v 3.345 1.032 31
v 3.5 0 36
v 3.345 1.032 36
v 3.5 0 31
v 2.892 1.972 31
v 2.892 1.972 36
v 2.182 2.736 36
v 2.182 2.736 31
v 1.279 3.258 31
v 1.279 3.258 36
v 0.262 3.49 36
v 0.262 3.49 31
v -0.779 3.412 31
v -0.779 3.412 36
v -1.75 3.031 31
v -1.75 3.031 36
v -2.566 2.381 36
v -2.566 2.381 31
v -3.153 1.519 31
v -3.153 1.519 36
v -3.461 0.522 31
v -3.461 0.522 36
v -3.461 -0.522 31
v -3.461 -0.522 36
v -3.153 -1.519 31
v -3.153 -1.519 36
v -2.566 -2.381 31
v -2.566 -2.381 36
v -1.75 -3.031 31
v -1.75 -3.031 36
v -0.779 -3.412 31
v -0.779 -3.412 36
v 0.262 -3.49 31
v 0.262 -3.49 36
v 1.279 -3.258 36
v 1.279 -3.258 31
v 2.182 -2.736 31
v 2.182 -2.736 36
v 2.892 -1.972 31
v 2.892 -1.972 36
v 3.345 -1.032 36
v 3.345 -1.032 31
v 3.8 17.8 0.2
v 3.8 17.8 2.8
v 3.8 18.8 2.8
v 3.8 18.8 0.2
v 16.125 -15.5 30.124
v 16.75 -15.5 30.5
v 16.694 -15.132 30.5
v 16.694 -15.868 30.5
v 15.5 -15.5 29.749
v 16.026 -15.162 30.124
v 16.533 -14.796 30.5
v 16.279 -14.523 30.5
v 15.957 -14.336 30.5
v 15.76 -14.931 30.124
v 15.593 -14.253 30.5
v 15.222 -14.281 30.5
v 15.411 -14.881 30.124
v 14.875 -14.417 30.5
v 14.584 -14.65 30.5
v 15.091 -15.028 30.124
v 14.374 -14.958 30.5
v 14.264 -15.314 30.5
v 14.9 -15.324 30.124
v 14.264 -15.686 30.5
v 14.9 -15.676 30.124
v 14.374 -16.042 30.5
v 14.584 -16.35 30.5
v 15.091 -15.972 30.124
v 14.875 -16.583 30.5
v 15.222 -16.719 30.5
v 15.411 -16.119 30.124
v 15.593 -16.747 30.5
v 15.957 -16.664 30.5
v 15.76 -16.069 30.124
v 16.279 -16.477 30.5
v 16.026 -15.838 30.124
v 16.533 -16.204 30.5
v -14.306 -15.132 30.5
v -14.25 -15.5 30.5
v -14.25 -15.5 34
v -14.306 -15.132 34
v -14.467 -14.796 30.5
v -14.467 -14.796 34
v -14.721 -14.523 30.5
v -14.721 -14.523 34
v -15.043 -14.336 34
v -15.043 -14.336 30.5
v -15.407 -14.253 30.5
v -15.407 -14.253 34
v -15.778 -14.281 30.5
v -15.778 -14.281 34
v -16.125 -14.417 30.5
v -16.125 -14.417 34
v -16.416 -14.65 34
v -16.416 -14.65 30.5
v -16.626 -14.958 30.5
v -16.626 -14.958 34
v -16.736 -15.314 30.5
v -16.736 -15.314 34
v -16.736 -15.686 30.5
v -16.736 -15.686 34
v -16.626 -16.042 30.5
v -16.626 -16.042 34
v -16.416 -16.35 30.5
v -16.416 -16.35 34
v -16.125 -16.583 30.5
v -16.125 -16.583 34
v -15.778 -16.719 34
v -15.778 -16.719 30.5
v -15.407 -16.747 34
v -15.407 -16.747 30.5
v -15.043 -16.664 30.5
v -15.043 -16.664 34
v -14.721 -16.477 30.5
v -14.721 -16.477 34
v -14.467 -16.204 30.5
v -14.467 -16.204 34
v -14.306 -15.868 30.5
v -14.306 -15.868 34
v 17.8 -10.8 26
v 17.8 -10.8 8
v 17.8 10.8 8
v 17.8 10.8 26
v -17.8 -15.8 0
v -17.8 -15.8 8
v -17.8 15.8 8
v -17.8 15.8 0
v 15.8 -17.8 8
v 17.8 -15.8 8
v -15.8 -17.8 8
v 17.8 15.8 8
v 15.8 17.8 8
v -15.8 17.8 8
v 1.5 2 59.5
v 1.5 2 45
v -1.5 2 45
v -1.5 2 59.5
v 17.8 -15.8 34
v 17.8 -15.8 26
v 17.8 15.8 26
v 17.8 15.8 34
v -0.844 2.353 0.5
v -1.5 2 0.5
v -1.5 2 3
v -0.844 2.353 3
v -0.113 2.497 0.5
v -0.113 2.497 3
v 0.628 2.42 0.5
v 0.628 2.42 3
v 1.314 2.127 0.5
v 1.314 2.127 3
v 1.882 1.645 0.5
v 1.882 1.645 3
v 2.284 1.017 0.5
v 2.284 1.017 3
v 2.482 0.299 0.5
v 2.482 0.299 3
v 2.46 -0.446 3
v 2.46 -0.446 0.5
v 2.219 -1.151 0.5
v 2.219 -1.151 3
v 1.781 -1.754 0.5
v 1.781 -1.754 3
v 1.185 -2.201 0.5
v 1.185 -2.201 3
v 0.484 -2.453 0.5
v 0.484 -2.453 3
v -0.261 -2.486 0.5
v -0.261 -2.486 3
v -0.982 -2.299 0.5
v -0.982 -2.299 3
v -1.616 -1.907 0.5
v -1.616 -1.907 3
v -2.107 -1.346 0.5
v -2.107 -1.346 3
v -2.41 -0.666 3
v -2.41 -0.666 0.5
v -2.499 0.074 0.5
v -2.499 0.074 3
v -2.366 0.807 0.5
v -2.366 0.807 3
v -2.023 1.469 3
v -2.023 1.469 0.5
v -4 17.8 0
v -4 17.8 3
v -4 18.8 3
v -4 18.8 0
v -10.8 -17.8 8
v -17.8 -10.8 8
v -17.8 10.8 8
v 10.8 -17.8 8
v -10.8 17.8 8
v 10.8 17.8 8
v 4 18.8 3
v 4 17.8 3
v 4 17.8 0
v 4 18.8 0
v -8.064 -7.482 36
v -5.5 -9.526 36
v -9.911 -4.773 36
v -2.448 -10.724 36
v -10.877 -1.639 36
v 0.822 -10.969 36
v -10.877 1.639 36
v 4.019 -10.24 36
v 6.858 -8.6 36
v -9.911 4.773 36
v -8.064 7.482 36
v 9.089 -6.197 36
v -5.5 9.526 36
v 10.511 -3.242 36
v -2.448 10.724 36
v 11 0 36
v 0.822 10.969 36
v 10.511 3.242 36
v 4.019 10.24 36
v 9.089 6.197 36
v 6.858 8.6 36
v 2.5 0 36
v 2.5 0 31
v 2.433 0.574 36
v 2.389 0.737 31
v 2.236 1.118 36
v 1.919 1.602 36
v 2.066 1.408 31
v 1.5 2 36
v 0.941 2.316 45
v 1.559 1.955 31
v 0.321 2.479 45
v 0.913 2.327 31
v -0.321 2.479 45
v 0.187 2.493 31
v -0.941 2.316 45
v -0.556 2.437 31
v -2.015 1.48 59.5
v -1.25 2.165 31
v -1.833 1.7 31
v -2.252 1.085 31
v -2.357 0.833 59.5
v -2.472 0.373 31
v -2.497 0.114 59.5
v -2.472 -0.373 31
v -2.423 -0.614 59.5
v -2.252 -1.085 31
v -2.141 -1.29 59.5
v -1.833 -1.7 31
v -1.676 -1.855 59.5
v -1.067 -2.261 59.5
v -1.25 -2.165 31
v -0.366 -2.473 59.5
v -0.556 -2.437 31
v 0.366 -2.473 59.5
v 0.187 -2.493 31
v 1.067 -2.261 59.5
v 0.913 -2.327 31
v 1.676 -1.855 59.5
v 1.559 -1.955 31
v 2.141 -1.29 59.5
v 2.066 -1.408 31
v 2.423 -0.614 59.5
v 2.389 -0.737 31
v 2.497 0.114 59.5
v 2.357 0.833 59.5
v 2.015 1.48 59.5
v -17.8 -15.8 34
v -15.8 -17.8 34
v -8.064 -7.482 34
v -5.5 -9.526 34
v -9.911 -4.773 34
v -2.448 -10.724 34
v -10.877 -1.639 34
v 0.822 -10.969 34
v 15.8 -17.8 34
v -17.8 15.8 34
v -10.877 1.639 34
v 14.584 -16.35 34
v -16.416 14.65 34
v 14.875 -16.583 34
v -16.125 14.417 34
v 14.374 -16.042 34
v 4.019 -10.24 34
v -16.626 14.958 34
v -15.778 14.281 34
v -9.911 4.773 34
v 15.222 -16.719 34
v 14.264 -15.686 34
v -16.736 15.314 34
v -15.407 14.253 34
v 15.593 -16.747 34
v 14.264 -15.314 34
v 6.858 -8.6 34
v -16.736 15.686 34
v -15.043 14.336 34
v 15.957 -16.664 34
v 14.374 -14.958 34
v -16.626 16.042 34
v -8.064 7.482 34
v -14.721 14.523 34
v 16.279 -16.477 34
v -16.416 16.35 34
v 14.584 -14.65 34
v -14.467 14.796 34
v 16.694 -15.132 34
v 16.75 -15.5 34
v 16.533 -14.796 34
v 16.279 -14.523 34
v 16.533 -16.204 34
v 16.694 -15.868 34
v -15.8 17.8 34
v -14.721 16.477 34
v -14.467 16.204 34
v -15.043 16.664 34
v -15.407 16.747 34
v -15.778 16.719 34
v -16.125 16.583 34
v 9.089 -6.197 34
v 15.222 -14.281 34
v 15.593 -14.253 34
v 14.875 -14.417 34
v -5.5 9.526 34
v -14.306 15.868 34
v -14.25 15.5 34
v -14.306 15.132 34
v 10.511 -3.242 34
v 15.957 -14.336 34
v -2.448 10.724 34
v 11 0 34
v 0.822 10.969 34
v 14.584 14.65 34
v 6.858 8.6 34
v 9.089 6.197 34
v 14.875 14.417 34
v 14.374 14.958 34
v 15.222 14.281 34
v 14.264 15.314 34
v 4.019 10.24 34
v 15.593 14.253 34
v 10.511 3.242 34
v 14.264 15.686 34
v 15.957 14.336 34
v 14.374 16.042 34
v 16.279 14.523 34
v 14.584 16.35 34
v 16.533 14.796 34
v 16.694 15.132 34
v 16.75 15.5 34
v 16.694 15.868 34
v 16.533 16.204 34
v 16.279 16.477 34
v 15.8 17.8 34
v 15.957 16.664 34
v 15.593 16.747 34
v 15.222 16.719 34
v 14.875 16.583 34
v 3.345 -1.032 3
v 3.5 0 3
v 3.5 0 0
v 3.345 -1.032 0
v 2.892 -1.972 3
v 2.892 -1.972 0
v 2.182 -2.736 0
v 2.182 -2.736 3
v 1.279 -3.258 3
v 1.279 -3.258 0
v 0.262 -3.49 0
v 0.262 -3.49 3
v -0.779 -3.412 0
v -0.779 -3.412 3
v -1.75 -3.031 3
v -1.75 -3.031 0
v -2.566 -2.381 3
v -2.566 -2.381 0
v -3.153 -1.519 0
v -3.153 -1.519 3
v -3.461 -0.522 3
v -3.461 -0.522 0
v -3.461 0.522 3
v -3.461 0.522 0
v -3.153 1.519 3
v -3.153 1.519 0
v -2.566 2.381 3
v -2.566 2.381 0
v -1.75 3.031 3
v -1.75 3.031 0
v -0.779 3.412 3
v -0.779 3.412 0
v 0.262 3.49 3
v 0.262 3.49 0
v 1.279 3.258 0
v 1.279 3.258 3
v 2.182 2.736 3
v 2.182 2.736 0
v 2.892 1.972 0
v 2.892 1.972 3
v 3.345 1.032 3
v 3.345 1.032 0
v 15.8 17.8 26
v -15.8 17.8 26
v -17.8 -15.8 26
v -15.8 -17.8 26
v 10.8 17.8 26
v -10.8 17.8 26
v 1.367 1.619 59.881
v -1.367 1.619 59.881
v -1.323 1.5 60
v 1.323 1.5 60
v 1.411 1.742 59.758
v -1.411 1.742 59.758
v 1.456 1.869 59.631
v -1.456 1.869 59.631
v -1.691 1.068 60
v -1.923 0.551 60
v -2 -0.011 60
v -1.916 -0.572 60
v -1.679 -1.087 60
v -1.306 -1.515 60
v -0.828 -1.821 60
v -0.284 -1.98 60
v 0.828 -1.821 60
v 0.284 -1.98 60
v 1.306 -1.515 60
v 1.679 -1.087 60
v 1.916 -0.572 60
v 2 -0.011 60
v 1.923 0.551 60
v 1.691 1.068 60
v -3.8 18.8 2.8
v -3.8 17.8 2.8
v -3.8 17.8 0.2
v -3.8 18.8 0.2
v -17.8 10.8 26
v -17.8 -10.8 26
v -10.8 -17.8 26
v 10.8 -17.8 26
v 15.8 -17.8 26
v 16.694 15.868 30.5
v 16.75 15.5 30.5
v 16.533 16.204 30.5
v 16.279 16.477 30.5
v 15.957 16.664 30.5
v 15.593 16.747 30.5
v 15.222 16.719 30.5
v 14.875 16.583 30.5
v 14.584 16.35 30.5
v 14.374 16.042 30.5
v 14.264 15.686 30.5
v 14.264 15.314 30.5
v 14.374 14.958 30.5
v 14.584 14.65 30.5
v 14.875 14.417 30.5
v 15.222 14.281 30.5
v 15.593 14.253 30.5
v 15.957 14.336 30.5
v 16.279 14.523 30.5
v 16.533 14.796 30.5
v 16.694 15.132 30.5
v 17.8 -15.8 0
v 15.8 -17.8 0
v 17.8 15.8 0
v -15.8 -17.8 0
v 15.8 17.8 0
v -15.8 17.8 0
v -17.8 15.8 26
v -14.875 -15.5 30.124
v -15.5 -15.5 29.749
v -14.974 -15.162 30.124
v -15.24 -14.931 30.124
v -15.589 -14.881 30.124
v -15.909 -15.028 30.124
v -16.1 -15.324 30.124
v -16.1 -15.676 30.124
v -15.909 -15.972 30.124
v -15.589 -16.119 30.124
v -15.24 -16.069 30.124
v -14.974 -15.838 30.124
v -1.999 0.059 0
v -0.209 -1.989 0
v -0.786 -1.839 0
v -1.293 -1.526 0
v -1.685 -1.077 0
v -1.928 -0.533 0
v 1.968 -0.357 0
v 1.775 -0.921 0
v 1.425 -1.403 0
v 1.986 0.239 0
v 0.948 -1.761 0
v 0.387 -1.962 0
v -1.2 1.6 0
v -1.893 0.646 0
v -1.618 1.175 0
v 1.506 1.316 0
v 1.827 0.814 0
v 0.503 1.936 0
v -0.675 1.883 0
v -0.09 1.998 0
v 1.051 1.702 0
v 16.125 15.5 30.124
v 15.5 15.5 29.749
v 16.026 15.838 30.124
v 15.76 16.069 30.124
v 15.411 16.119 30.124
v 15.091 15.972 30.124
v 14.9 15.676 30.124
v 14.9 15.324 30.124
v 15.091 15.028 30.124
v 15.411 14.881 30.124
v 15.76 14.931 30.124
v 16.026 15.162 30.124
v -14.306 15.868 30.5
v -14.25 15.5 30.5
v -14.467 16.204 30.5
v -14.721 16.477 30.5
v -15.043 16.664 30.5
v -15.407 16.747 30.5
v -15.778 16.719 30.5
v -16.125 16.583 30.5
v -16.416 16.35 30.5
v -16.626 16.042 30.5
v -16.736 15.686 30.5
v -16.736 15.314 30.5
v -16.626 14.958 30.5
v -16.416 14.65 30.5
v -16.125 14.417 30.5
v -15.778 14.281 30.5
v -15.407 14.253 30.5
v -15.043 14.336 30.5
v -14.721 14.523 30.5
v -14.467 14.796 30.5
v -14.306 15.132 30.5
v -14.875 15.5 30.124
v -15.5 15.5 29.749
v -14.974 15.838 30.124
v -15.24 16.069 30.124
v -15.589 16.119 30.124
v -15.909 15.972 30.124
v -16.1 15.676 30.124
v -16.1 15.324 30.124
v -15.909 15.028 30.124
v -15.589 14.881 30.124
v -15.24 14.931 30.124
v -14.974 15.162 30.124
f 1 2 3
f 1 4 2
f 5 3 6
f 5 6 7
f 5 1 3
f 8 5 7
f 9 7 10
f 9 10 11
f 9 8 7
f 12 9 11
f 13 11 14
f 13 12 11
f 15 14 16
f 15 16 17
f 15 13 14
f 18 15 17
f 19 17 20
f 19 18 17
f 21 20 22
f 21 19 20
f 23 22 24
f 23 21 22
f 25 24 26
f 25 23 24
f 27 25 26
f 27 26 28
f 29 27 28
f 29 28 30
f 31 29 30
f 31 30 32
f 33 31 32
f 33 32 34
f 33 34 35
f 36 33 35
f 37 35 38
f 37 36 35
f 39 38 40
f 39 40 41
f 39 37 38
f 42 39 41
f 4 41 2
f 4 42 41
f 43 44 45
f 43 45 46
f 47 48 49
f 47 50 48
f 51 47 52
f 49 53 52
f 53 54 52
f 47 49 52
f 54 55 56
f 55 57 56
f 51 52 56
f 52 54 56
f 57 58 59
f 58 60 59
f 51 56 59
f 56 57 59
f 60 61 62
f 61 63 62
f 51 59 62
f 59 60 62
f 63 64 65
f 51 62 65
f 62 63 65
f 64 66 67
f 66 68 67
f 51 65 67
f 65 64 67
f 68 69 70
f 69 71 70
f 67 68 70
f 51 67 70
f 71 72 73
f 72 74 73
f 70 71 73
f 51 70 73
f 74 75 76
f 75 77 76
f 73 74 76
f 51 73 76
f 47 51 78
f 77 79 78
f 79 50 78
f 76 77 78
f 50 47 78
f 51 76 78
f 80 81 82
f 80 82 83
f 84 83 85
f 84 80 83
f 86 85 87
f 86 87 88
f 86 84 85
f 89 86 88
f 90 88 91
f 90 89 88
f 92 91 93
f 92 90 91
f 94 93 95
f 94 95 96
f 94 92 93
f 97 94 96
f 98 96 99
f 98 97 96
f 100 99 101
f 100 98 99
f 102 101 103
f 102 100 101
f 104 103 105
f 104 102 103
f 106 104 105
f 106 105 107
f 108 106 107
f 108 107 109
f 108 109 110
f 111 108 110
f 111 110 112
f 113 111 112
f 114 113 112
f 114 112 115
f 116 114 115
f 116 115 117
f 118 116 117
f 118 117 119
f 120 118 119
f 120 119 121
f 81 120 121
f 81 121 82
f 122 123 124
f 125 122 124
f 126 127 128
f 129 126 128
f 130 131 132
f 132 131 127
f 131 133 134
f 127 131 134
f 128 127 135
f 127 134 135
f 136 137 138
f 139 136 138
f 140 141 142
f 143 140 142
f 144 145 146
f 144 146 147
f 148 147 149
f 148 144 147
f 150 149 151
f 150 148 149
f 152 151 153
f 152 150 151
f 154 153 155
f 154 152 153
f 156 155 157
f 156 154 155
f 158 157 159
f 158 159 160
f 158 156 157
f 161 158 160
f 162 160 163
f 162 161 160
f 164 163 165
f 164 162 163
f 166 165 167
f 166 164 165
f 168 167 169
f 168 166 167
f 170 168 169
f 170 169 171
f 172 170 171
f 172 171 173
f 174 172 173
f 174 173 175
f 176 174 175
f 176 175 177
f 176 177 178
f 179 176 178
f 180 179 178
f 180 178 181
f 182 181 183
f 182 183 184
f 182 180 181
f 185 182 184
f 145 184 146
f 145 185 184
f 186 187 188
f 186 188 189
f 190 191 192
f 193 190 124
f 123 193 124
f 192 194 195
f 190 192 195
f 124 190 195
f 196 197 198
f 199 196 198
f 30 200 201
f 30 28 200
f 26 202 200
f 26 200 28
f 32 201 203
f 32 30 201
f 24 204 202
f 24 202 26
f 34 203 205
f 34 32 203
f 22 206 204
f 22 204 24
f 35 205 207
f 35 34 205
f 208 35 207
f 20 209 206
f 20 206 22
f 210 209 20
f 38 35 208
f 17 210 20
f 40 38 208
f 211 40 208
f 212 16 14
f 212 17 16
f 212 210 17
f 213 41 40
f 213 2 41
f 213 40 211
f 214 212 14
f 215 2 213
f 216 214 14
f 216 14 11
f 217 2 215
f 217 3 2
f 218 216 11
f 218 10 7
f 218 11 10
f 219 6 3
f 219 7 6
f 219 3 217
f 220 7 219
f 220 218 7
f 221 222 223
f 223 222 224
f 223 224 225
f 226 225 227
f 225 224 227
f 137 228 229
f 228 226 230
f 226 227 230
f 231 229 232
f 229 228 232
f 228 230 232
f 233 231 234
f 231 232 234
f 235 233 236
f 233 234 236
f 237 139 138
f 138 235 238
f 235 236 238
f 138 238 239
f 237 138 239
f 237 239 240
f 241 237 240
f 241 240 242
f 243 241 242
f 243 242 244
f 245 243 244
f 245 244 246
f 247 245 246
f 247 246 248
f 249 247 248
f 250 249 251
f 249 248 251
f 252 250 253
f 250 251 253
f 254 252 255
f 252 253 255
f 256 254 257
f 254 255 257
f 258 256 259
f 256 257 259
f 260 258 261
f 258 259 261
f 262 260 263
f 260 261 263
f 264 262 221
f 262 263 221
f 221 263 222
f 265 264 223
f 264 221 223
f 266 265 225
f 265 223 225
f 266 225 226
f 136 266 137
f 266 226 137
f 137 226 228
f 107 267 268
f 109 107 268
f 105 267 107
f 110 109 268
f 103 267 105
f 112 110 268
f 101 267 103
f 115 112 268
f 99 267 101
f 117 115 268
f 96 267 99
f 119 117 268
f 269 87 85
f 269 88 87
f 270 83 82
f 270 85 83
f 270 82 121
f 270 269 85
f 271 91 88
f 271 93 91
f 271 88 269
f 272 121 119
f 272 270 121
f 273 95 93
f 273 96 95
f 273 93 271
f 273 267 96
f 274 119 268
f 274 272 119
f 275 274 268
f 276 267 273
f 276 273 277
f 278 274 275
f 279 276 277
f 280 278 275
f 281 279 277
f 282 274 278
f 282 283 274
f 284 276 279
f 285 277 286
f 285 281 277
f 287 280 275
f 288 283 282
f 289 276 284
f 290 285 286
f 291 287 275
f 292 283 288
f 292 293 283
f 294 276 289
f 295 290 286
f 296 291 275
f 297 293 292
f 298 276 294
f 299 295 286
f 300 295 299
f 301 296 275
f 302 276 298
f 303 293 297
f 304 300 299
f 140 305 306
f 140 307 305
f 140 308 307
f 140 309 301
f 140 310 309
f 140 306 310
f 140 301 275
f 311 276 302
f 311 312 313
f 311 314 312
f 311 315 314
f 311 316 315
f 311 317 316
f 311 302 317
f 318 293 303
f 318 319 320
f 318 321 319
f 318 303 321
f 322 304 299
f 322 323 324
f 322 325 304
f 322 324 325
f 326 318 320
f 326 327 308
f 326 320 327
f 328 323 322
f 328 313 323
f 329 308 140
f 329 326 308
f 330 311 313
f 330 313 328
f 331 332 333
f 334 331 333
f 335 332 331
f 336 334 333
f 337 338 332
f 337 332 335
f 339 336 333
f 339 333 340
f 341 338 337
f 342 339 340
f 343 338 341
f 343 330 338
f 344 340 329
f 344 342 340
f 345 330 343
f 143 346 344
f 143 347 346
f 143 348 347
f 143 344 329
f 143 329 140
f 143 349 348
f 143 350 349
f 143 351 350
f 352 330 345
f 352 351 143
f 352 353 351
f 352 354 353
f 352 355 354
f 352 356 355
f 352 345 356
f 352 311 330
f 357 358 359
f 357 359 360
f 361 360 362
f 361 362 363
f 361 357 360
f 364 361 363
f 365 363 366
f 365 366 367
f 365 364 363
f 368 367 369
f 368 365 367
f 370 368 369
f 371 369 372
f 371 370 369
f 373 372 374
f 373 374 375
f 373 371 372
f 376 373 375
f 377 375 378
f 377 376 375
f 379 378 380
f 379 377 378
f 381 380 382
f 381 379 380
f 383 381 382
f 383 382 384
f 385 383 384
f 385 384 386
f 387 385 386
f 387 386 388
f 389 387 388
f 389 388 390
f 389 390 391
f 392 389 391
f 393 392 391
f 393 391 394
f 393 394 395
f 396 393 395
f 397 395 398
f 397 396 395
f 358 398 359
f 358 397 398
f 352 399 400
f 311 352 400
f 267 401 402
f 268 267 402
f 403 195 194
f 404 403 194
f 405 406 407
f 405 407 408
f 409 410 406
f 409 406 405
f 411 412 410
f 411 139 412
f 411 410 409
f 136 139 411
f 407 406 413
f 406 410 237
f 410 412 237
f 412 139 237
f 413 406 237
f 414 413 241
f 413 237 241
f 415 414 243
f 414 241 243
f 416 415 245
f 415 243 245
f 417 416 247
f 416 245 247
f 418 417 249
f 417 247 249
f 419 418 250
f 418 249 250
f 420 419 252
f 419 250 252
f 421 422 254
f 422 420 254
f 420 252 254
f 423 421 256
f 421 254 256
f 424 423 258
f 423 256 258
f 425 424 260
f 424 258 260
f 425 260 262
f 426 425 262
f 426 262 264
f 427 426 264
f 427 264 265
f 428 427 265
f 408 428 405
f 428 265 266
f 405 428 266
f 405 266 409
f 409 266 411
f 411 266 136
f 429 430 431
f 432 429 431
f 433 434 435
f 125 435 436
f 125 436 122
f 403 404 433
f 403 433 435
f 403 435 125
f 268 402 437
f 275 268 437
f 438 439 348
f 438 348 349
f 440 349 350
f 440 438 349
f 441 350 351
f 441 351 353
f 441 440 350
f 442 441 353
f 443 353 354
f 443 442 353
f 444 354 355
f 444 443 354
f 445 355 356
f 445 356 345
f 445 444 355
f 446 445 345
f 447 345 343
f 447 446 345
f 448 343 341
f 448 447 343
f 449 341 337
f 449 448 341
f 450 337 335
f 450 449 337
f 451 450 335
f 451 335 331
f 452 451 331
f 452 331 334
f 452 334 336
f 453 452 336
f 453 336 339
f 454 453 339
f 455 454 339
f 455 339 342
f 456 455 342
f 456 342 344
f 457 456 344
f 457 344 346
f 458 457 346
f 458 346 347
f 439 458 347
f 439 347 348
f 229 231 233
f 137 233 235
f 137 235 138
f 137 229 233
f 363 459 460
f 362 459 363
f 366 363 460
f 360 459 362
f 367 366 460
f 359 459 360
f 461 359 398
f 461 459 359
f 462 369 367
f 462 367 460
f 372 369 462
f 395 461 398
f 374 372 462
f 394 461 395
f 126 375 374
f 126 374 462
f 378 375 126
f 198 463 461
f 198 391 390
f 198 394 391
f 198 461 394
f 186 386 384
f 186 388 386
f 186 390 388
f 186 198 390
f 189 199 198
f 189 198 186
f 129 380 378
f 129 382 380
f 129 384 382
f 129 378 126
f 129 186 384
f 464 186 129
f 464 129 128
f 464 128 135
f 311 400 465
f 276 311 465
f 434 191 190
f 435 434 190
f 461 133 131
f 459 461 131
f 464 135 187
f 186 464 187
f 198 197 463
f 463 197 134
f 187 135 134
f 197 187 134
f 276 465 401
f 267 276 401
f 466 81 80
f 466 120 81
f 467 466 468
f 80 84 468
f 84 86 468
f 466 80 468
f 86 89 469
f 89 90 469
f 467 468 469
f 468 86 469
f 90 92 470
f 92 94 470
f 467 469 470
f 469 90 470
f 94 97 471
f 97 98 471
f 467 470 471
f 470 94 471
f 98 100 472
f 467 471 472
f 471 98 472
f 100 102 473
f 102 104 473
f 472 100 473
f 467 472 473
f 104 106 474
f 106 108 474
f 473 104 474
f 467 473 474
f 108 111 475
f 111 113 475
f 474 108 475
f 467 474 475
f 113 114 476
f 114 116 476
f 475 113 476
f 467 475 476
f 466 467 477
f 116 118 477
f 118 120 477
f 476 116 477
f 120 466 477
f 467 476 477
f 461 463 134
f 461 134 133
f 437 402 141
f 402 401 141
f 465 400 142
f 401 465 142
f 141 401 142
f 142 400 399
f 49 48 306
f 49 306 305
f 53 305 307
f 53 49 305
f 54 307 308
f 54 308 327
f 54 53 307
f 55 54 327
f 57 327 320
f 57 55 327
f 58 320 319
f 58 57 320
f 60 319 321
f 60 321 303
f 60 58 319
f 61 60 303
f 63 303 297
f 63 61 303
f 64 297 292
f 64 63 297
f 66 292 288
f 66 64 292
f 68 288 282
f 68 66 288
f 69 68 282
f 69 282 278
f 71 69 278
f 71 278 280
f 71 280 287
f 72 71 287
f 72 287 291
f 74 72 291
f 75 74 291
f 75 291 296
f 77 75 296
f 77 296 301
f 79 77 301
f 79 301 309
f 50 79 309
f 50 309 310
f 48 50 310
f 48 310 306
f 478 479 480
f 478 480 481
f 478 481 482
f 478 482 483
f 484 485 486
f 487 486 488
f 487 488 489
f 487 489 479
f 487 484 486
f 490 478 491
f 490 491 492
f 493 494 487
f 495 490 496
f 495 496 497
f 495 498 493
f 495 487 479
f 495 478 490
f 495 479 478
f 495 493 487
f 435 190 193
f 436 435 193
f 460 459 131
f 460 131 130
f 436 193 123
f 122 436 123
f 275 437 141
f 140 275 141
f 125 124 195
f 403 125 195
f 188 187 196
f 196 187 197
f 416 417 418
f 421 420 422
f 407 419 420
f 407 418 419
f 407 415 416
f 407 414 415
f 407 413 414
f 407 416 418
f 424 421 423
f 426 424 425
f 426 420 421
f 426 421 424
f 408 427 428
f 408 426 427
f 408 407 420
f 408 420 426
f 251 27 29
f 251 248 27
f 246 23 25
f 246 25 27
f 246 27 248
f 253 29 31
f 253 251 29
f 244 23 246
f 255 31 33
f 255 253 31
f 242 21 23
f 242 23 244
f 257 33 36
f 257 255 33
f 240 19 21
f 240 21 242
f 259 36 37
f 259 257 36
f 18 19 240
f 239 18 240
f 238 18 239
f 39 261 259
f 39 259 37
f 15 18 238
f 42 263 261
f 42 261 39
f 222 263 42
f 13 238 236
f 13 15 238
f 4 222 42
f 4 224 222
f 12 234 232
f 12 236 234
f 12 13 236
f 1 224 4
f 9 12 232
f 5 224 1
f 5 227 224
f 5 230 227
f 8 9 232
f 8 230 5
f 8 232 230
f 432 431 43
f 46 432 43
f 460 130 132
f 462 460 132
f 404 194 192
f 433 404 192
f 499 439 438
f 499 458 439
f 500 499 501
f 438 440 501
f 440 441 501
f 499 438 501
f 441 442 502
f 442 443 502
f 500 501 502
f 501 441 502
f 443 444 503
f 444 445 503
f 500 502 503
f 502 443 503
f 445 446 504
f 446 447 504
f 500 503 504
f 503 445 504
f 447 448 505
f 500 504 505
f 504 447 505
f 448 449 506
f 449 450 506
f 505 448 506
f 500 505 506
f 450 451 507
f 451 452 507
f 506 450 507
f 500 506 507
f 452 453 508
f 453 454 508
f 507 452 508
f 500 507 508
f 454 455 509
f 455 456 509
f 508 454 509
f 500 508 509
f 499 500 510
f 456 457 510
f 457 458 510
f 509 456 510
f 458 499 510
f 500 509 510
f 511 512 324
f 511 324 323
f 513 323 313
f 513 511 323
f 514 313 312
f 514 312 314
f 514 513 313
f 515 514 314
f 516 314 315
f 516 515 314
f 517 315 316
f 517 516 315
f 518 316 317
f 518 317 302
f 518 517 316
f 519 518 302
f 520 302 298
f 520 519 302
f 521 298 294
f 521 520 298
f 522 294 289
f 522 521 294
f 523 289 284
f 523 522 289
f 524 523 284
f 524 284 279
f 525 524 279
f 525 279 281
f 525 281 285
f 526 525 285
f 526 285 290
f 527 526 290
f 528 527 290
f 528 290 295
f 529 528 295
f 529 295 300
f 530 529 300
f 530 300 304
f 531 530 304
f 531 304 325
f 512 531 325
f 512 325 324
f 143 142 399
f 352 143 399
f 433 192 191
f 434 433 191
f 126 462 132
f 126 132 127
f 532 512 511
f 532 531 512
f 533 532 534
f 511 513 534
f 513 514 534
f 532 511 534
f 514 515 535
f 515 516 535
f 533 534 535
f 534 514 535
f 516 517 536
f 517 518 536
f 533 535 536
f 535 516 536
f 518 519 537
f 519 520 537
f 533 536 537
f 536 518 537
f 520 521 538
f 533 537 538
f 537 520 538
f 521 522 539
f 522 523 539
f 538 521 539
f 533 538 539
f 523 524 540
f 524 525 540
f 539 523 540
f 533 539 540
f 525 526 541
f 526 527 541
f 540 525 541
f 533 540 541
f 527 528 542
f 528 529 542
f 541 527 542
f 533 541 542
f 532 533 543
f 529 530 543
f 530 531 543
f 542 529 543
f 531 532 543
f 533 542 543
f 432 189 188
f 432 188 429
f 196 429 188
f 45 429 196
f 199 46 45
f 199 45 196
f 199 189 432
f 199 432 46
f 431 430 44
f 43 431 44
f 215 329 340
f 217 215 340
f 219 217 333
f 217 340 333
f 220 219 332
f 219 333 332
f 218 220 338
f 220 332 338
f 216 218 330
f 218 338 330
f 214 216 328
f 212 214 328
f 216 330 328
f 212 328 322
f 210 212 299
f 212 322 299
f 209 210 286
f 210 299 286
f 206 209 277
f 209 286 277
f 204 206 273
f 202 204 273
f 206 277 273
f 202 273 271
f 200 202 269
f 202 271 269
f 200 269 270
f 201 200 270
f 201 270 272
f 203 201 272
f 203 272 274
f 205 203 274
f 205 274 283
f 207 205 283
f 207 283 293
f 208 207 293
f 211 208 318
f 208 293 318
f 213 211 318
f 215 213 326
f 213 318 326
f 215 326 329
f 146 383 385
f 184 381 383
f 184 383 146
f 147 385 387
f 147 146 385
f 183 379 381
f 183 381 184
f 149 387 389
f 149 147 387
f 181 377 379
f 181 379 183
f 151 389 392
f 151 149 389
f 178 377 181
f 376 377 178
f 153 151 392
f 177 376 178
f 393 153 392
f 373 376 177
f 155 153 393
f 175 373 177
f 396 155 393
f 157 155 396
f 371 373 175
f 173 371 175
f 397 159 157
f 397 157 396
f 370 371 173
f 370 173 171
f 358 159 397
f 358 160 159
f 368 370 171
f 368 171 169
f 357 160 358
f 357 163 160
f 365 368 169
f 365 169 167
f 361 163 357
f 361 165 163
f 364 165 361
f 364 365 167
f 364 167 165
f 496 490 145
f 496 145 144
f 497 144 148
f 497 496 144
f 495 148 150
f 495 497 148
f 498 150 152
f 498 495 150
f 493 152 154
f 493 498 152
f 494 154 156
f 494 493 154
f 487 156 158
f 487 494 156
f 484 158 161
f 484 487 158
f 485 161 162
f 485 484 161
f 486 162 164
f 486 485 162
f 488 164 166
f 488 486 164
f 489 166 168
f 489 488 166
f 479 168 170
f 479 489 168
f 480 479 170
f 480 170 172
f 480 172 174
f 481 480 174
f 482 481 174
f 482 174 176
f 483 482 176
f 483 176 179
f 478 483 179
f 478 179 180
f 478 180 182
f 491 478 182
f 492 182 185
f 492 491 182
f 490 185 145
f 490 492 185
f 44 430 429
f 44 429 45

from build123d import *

# Parameters (mm, degrees)
BOSS_EXTRUDE1_DEPTH         = 8
BOSS_EXTRUDE2_DEPTH         = 18
TAP_DRILL_FOR_M3_TAP1_D     = 2.5
TAP_DRILL_FOR_M3_TAP1_DEPTH = 3.5
TAP_DRILL_FOR_M3_TAP1_TIP   = 0.751075774
SKETCH6_R                   = 11
BOSS_EXTRUDE3_DEPTH         = 2
SKETCH7_R                   = 3.5
CUT_EXTRUDE1_DEPTH          = 5
SKETCH8_R                   = 2.5
BOSS_EXTRUDE4_DEPTH         = 29
SKETCH9_W                   = 5
SKETCH9_H                   = 2
CUT_EXTRUDE2_DEPTH          = 15
CHAMFER1_SIZE               = 0.5
CUT_EXTRUDE3_START          = -3
SKETCH10_R                  = 3.5
CUT_EXTRUDE3_DEPTH          = 3
BOSS_EXTRUDE5_START         = 3
SKETCH11_R                  = 2.5
BOSS_EXTRUDE5_DEPTH         = 3
CHAMFER2_SIZE               = 0.5
SKETCH12_W                  = 8
SKETCH12_H                  = 3
SKETCH12_W_2                = 7.6
SKETCH12_H_2                = 2.6
BOSS_EXTRUDE6_DEPTH         = 1
SPLIT1_START                = 8
SPLIT1_DEPTH                = 52
SPLIT1_2_DEPTH              = 18
SPLIT1_START_2              = 26
SPLIT1_3_OUTLINE_R          = 3.5
SPLIT1_3_OUTLINE_R_2        = 1.25
SPLIT1_3_OUTLINE_R_3        = 2.5
SPLIT1_3_DEPTH              = 8
SPLIT1_START_3              = 34
SPLIT1_4_OUTLINE_R          = 11
SPLIT1_4_OUTLINE_R_2        = 3.5
SPLIT1_4_OUTLINE_R_3        = 2.5
SPLIT1_4_DEPTH              = 2
SPLIT1_START_4              = 36
SPLIT1_5_DEPTH              = 24
SPLIT1_6_OUTLINE_R          = 1.25
SPLIT1_6_OUTLINE_R_2        = 3.5
SPLIT1_6_OUTLINE_R_3        = 2.5
SPLIT1_6_DEPTH              = 4.4999999
SPLIT1_START_5              = 29.748924126
SPLIT1_7_OUTLINE_R          = 3.5
SPLIT1_7_OUTLINE_R_2        = 2.5
SPLIT1_7_DEPTH              = 1.251075874
SPLIT1_8_DEPTH              = 9
SPLIT1_START_6              = 43.487067043
SPLIT1_10_OUTLINE_W         = 6
SPLIT1_10_OUTLINE_H         = 4
SPLIT1_10_DEPTH             = 1.512932957


with BuildPart() as part:
    # Sketch1 → Boss-Extrude1 (new body)
    with BuildSketch(Plane.XY):
        Polygon((-17.8, 15.8), (-15.8, 17.8), (15.8, 17.8), (17.8, 15.8), (17.8, -15.8), (15.8, -17.8), (-15.8, -17.8), (-17.8, -15.8), align=None)
    boss_extrude1 = extrude(amount=BOSS_EXTRUDE1_DEPTH)

    # Sketch2 → Boss-Extrude2 (add)
    with BuildSketch(Plane.XY.offset(8)):
        Polygon((10.8, -17.8), (-10.8, -17.8), (-17.8, -10.8), (-17.8, 10.8), (-10.8, 17.8), (10.8, 17.8), (17.8, 10.8), (17.8, -10.8), align=None)
    extrude(amount=BOSS_EXTRUDE2_DEPTH)

    # Mirror1: Boss-Extrude1 across plane
    add(boss_extrude1.mirror(Plane.XY.offset(17)))

    # Tap Drill for M3 Tap1
    with Locations(Plane.XY.offset(34)):
        with Locations((-15.5, 15.5), (15.5, 15.5), (15.5, -15.5), (-15.5, -15.5)):
            Hole(TAP_DRILL_FOR_M3_TAP1_D / 2, depth=TAP_DRILL_FOR_M3_TAP1_DEPTH)
            with Locations((0, 0, -(TAP_DRILL_FOR_M3_TAP1_DEPTH + TAP_DRILL_FOR_M3_TAP1_TIP / 2))):  # 118° drill point
                Cone(0, TAP_DRILL_FOR_M3_TAP1_D / 2, TAP_DRILL_FOR_M3_TAP1_TIP, mode=Mode.SUBTRACT)

    # Sketch6 → Boss-Extrude3 (add)
    with BuildSketch(Plane.XY.offset(34)):
        with Locations(Location((0, 0, 0), (0, 0, 180))):
            Circle(SKETCH6_R)
    extrude(amount=BOSS_EXTRUDE3_DEPTH)

    # Sketch7 → Cut-Extrude1 (cut)
    with BuildSketch(Plane.XY.offset(36)):
        Circle(SKETCH7_R)
    extrude(amount=-CUT_EXTRUDE1_DEPTH, mode=Mode.SUBTRACT)

    # Sketch8 → Boss-Extrude4 (add)
    with BuildSketch(Plane.XY.offset(31)):
        with Locations(Location((0, 0, 0), (0, 0, 180))):
            Circle(SKETCH8_R)
    extrude(amount=BOSS_EXTRUDE4_DEPTH)

    # Sketch9 → Cut-Extrude2 (cut)
    with BuildSketch(Plane.XY.offset(60)):
        with Locations((0, 3)):
            Rectangle(SKETCH9_W, SKETCH9_H)
    extrude(amount=-CUT_EXTRUDE2_DEPTH, mode=Mode.SUBTRACT)

    # Chamfer1
    chamfer1_edges = [part.edges().sort_by_distance(p)[0] for p in [
        (1.118033989, -2.236067977, 60),
        (0, 2, 60),
    ]]
    chamfer(chamfer1_edges, length=CHAMFER1_SIZE - 0.0001)  # a hair under: the kernel refuses the full size

    # Sketch10 → Cut-Extrude3 (cut)
    with BuildSketch(Plane(origin=(0, 0, 0), x_dir=(-1, 0, 0), z_dir=(0, 0, -1)).offset(CUT_EXTRUDE3_START)):
        with Locations(Location((0, 0, 0), (0, 0, 180))):
            Circle(SKETCH10_R)
    extrude(amount=CUT_EXTRUDE3_DEPTH, mode=Mode.SUBTRACT)

    # Sketch11 → Boss-Extrude5 (add)
    with BuildSketch(Plane(origin=(0, 0, 3), x_dir=(-1, 0, 0), z_dir=(0, 0, -1)).offset(BOSS_EXTRUDE5_START)):
        with Locations(Location((0, 0, 0), (0, 0, 53.130102354))):
            Circle(SKETCH11_R)
    extrude(amount=-BOSS_EXTRUDE5_DEPTH)

    # Chamfer2
    chamfer2_edges = [part.edges().sort_by_distance(p)[0] for p in [
        (1.5, -2, 0),
    ]]
    chamfer(chamfer2_edges, length=CHAMFER2_SIZE)

    # Sketch12 → Boss-Extrude6 (add)
    with BuildSketch(Plane(origin=(0, 17.8, 0), x_dir=(1, 0, 0), z_dir=(0, 1, 0))):
        with Locations((0, -1.5)):
            Rectangle(SKETCH12_W, SKETCH12_H)
        with Locations((0, -1.5)):
            Rectangle(SKETCH12_W_2, SKETCH12_H_2, mode=Mode.SUBTRACT)
    extrude(amount=BOSS_EXTRUDE6_DEPTH)

    # Split1: read off the stored shape, not the designer's step
    # Split1 outline → Split1 (cut)
    with BuildSketch(Plane.XY.offset(SPLIT1_START)):
        Polygon((-15.8, 17.8), (-17.8, 15.8), (-17.8, -15.8), (-15.8, -17.8), (15.8, -17.8), (17.8, -15.8), (17.8, 15.8), (15.8, 17.8), align=None)
    extrude(amount=SPLIT1_DEPTH, mode=Mode.SUBTRACT)


with BuildPart() as body_2:
    # Split1 2 outline → Split1 2 (new body)
    with BuildSketch(Plane.XY.offset(SPLIT1_START)):
        Polygon((-17.8, 10.8), (-17.8, -10.8), (-10.8, -17.8), (10.8, -17.8), (17.8, -10.8), (17.8, 10.8), (10.8, 17.8), (-10.8, 17.8), align=None)
    extrude(amount=SPLIT1_2_DEPTH)


with BuildPart() as body_3:
    # Split1 3 outline → Split1 3 (new body)
    # profile 1 of 2: a face of its own
    with BuildSketch(Plane.XY.offset(SPLIT1_START_2)):
        Polygon((-15.8, -17.8), (15.8, -17.8), (17.8, -15.8), (17.8, 15.8), (15.8, 17.8), (-15.8, 17.8), (-17.8, 15.8), (-17.8, -15.8), align=None)
        Circle(SPLIT1_3_OUTLINE_R, mode=Mode.SUBTRACT)
        with Locations((-15.5, -15.5)):
            Circle(SPLIT1_3_OUTLINE_R_2, mode=Mode.SUBTRACT)
        with Locations((15.5, -15.5)):
            Circle(SPLIT1_3_OUTLINE_R_2, mode=Mode.SUBTRACT)
        with Locations((-15.5, 15.5)):
            Circle(SPLIT1_3_OUTLINE_R_2, mode=Mode.SUBTRACT)
        with Locations((15.5, 15.5)):
            Circle(SPLIT1_3_OUTLINE_R_2, mode=Mode.SUBTRACT)
    # profile 2 of 2: a face of its own
    with BuildSketch(Plane.XY.offset(SPLIT1_START_2)):
        Circle(SPLIT1_3_OUTLINE_R_3)
    extrude(amount=SPLIT1_3_DEPTH)

    # Split1 4 outline → Split1 4 (add)
    # profile 1 of 2: a face of its own
    with BuildSketch(Plane.XY.offset(SPLIT1_START_3)):
        Circle(SPLIT1_4_OUTLINE_R)
        Circle(SPLIT1_4_OUTLINE_R_2, mode=Mode.SUBTRACT)
    # profile 2 of 2: a face of its own
    with BuildSketch(Plane.XY.offset(SPLIT1_START_3)):
        Circle(SPLIT1_4_OUTLINE_R_3)
    extrude(amount=SPLIT1_4_DEPTH)

    # Split1 5 outline → Split1 5 (add)
    with BuildSketch(Plane.XY.offset(SPLIT1_START_4)):
        with BuildLine():
            Line((1.5, 2), (-1.5, 2))
            ThreePointArc((-1.5, 2), (0, -2.5), (1.5, 2))
        make_face()
    extrude(amount=SPLIT1_5_DEPTH)

    # Split1 6 outline → Split1 6 (add)
    # profile 1 of 5: a face of its own
    with BuildSketch(Plane.XY.offset(SPLIT1_START_2)):
        with Locations((-15.5, -15.5)):
            Circle(SPLIT1_6_OUTLINE_R)
    # profile 2 of 5: a face of its own
    with BuildSketch(Plane.XY.offset(SPLIT1_START_2)):
        with Locations((15.5, -15.5)):
            Circle(SPLIT1_6_OUTLINE_R)
    # profile 3 of 5: a face of its own
    with BuildSketch(Plane.XY.offset(SPLIT1_START_2)):
        with Locations((15.5, 15.5)):
            Circle(SPLIT1_6_OUTLINE_R)
    # profile 4 of 5: a face of its own
    with BuildSketch(Plane.XY.offset(SPLIT1_START_2)):
        with Locations((-15.5, 15.5)):
            Circle(SPLIT1_6_OUTLINE_R)
    # profile 5 of 5: a face of its own
    with BuildSketch(Plane.XY.offset(SPLIT1_START_2)):
        Circle(SPLIT1_6_OUTLINE_R_2)
        Circle(SPLIT1_6_OUTLINE_R_3, mode=Mode.SUBTRACT)
    extrude(amount=SPLIT1_6_DEPTH)

    # Split1 7 outline → Split1 7 (add)
    with BuildSketch(Plane.XY.offset(SPLIT1_START_5)):
        Circle(SPLIT1_7_OUTLINE_R)
        Circle(SPLIT1_7_OUTLINE_R_2, mode=Mode.SUBTRACT)
    extrude(amount=SPLIT1_7_DEPTH)

    # Split1 8 outline → Split1 8 (add)
    with BuildSketch(Plane.XY.offset(SPLIT1_START_4)):
        with BuildLine():
            ThreePointArc((1.5, 2), (0, 2.5), (-1.5, 2))
            Line((-1.5, 2), (1.5, 2))
        make_face()
    extrude(amount=SPLIT1_8_DEPTH)

    # Split1 9 outline → Split1 9 (revolve, cut)
    with BuildSketch(Plane.XZ):
        Polygon((2.5, 60), (2, 60), (2.5, 59.5), align=None)
    revolve(axis=Axis((0, 0, 0), (0, 0, 1)), mode=Mode.SUBTRACT)

    # Split1 10 outline → Split1 10 (cut)
    with BuildSketch(Plane(origin=(0, 0, 0), x_dir=(1, 0, 0), z_dir=(0, 0.707106781186543, 0.707106781186552)).offset(SPLIT1_START_6)):
        with Locations((0, -41)):
            Rectangle(SPLIT1_10_OUTLINE_W, SPLIT1_10_OUTLINE_H)
    extrude(amount=SPLIT1_10_DEPTH, mode=Mode.SUBTRACT)

    # Split1 11 outline → Split1 11 (revolve, cut)
    with BuildSketch(Plane(origin=(-15.5, -15.5, 0), x_dir=(1, 0, 0), z_dir=(0, -1, 0))):
        Polygon((0, 30.5), (0, 29.748924226), (1.25, 30.5), align=None)
    revolve(axis=Axis((-15.5, -15.5, 0), (0, 0, 1)), mode=Mode.SUBTRACT)

    # Split1 12 outline → Split1 12 (revolve, cut)
    with BuildSketch(Plane(origin=(15.5, -15.5, 0), x_dir=(1, 0, 0), z_dir=(0, -1, 0))):
        Polygon((0, 30.5), (0, 29.748924226), (1.25, 30.5), align=None)
    revolve(axis=Axis((15.5, -15.5, 0), (0, 0, 1)), mode=Mode.SUBTRACT)

    # Split1 13 outline → Split1 13 (revolve, cut)
    with BuildSketch(Plane(origin=(15.5, 15.5, 0), x_dir=(1, 0, 0), z_dir=(0, -1, 0))):
        Polygon((0, 30.5), (0, 29.748924226), (1.25, 30.5), align=None)
    revolve(axis=Axis((15.5, 15.5, 0), (0, 0, 1)), mode=Mode.SUBTRACT)

    # Split1 14 outline → Split1 14 (revolve, cut)
    with BuildSketch(Plane(origin=(-15.5, 15.5, 0), x_dir=(1, 0, 0), z_dir=(0, -1, 0))):
        Polygon((0, 30.5), (0, 29.748924226), (1.25, 30.5), align=None)
    revolve(axis=Axis((-15.5, 15.5, 0), (0, 0, 1)), mode=Mode.SUBTRACT)


solid = Compound([part.part, body_2.part, body_3.part])
